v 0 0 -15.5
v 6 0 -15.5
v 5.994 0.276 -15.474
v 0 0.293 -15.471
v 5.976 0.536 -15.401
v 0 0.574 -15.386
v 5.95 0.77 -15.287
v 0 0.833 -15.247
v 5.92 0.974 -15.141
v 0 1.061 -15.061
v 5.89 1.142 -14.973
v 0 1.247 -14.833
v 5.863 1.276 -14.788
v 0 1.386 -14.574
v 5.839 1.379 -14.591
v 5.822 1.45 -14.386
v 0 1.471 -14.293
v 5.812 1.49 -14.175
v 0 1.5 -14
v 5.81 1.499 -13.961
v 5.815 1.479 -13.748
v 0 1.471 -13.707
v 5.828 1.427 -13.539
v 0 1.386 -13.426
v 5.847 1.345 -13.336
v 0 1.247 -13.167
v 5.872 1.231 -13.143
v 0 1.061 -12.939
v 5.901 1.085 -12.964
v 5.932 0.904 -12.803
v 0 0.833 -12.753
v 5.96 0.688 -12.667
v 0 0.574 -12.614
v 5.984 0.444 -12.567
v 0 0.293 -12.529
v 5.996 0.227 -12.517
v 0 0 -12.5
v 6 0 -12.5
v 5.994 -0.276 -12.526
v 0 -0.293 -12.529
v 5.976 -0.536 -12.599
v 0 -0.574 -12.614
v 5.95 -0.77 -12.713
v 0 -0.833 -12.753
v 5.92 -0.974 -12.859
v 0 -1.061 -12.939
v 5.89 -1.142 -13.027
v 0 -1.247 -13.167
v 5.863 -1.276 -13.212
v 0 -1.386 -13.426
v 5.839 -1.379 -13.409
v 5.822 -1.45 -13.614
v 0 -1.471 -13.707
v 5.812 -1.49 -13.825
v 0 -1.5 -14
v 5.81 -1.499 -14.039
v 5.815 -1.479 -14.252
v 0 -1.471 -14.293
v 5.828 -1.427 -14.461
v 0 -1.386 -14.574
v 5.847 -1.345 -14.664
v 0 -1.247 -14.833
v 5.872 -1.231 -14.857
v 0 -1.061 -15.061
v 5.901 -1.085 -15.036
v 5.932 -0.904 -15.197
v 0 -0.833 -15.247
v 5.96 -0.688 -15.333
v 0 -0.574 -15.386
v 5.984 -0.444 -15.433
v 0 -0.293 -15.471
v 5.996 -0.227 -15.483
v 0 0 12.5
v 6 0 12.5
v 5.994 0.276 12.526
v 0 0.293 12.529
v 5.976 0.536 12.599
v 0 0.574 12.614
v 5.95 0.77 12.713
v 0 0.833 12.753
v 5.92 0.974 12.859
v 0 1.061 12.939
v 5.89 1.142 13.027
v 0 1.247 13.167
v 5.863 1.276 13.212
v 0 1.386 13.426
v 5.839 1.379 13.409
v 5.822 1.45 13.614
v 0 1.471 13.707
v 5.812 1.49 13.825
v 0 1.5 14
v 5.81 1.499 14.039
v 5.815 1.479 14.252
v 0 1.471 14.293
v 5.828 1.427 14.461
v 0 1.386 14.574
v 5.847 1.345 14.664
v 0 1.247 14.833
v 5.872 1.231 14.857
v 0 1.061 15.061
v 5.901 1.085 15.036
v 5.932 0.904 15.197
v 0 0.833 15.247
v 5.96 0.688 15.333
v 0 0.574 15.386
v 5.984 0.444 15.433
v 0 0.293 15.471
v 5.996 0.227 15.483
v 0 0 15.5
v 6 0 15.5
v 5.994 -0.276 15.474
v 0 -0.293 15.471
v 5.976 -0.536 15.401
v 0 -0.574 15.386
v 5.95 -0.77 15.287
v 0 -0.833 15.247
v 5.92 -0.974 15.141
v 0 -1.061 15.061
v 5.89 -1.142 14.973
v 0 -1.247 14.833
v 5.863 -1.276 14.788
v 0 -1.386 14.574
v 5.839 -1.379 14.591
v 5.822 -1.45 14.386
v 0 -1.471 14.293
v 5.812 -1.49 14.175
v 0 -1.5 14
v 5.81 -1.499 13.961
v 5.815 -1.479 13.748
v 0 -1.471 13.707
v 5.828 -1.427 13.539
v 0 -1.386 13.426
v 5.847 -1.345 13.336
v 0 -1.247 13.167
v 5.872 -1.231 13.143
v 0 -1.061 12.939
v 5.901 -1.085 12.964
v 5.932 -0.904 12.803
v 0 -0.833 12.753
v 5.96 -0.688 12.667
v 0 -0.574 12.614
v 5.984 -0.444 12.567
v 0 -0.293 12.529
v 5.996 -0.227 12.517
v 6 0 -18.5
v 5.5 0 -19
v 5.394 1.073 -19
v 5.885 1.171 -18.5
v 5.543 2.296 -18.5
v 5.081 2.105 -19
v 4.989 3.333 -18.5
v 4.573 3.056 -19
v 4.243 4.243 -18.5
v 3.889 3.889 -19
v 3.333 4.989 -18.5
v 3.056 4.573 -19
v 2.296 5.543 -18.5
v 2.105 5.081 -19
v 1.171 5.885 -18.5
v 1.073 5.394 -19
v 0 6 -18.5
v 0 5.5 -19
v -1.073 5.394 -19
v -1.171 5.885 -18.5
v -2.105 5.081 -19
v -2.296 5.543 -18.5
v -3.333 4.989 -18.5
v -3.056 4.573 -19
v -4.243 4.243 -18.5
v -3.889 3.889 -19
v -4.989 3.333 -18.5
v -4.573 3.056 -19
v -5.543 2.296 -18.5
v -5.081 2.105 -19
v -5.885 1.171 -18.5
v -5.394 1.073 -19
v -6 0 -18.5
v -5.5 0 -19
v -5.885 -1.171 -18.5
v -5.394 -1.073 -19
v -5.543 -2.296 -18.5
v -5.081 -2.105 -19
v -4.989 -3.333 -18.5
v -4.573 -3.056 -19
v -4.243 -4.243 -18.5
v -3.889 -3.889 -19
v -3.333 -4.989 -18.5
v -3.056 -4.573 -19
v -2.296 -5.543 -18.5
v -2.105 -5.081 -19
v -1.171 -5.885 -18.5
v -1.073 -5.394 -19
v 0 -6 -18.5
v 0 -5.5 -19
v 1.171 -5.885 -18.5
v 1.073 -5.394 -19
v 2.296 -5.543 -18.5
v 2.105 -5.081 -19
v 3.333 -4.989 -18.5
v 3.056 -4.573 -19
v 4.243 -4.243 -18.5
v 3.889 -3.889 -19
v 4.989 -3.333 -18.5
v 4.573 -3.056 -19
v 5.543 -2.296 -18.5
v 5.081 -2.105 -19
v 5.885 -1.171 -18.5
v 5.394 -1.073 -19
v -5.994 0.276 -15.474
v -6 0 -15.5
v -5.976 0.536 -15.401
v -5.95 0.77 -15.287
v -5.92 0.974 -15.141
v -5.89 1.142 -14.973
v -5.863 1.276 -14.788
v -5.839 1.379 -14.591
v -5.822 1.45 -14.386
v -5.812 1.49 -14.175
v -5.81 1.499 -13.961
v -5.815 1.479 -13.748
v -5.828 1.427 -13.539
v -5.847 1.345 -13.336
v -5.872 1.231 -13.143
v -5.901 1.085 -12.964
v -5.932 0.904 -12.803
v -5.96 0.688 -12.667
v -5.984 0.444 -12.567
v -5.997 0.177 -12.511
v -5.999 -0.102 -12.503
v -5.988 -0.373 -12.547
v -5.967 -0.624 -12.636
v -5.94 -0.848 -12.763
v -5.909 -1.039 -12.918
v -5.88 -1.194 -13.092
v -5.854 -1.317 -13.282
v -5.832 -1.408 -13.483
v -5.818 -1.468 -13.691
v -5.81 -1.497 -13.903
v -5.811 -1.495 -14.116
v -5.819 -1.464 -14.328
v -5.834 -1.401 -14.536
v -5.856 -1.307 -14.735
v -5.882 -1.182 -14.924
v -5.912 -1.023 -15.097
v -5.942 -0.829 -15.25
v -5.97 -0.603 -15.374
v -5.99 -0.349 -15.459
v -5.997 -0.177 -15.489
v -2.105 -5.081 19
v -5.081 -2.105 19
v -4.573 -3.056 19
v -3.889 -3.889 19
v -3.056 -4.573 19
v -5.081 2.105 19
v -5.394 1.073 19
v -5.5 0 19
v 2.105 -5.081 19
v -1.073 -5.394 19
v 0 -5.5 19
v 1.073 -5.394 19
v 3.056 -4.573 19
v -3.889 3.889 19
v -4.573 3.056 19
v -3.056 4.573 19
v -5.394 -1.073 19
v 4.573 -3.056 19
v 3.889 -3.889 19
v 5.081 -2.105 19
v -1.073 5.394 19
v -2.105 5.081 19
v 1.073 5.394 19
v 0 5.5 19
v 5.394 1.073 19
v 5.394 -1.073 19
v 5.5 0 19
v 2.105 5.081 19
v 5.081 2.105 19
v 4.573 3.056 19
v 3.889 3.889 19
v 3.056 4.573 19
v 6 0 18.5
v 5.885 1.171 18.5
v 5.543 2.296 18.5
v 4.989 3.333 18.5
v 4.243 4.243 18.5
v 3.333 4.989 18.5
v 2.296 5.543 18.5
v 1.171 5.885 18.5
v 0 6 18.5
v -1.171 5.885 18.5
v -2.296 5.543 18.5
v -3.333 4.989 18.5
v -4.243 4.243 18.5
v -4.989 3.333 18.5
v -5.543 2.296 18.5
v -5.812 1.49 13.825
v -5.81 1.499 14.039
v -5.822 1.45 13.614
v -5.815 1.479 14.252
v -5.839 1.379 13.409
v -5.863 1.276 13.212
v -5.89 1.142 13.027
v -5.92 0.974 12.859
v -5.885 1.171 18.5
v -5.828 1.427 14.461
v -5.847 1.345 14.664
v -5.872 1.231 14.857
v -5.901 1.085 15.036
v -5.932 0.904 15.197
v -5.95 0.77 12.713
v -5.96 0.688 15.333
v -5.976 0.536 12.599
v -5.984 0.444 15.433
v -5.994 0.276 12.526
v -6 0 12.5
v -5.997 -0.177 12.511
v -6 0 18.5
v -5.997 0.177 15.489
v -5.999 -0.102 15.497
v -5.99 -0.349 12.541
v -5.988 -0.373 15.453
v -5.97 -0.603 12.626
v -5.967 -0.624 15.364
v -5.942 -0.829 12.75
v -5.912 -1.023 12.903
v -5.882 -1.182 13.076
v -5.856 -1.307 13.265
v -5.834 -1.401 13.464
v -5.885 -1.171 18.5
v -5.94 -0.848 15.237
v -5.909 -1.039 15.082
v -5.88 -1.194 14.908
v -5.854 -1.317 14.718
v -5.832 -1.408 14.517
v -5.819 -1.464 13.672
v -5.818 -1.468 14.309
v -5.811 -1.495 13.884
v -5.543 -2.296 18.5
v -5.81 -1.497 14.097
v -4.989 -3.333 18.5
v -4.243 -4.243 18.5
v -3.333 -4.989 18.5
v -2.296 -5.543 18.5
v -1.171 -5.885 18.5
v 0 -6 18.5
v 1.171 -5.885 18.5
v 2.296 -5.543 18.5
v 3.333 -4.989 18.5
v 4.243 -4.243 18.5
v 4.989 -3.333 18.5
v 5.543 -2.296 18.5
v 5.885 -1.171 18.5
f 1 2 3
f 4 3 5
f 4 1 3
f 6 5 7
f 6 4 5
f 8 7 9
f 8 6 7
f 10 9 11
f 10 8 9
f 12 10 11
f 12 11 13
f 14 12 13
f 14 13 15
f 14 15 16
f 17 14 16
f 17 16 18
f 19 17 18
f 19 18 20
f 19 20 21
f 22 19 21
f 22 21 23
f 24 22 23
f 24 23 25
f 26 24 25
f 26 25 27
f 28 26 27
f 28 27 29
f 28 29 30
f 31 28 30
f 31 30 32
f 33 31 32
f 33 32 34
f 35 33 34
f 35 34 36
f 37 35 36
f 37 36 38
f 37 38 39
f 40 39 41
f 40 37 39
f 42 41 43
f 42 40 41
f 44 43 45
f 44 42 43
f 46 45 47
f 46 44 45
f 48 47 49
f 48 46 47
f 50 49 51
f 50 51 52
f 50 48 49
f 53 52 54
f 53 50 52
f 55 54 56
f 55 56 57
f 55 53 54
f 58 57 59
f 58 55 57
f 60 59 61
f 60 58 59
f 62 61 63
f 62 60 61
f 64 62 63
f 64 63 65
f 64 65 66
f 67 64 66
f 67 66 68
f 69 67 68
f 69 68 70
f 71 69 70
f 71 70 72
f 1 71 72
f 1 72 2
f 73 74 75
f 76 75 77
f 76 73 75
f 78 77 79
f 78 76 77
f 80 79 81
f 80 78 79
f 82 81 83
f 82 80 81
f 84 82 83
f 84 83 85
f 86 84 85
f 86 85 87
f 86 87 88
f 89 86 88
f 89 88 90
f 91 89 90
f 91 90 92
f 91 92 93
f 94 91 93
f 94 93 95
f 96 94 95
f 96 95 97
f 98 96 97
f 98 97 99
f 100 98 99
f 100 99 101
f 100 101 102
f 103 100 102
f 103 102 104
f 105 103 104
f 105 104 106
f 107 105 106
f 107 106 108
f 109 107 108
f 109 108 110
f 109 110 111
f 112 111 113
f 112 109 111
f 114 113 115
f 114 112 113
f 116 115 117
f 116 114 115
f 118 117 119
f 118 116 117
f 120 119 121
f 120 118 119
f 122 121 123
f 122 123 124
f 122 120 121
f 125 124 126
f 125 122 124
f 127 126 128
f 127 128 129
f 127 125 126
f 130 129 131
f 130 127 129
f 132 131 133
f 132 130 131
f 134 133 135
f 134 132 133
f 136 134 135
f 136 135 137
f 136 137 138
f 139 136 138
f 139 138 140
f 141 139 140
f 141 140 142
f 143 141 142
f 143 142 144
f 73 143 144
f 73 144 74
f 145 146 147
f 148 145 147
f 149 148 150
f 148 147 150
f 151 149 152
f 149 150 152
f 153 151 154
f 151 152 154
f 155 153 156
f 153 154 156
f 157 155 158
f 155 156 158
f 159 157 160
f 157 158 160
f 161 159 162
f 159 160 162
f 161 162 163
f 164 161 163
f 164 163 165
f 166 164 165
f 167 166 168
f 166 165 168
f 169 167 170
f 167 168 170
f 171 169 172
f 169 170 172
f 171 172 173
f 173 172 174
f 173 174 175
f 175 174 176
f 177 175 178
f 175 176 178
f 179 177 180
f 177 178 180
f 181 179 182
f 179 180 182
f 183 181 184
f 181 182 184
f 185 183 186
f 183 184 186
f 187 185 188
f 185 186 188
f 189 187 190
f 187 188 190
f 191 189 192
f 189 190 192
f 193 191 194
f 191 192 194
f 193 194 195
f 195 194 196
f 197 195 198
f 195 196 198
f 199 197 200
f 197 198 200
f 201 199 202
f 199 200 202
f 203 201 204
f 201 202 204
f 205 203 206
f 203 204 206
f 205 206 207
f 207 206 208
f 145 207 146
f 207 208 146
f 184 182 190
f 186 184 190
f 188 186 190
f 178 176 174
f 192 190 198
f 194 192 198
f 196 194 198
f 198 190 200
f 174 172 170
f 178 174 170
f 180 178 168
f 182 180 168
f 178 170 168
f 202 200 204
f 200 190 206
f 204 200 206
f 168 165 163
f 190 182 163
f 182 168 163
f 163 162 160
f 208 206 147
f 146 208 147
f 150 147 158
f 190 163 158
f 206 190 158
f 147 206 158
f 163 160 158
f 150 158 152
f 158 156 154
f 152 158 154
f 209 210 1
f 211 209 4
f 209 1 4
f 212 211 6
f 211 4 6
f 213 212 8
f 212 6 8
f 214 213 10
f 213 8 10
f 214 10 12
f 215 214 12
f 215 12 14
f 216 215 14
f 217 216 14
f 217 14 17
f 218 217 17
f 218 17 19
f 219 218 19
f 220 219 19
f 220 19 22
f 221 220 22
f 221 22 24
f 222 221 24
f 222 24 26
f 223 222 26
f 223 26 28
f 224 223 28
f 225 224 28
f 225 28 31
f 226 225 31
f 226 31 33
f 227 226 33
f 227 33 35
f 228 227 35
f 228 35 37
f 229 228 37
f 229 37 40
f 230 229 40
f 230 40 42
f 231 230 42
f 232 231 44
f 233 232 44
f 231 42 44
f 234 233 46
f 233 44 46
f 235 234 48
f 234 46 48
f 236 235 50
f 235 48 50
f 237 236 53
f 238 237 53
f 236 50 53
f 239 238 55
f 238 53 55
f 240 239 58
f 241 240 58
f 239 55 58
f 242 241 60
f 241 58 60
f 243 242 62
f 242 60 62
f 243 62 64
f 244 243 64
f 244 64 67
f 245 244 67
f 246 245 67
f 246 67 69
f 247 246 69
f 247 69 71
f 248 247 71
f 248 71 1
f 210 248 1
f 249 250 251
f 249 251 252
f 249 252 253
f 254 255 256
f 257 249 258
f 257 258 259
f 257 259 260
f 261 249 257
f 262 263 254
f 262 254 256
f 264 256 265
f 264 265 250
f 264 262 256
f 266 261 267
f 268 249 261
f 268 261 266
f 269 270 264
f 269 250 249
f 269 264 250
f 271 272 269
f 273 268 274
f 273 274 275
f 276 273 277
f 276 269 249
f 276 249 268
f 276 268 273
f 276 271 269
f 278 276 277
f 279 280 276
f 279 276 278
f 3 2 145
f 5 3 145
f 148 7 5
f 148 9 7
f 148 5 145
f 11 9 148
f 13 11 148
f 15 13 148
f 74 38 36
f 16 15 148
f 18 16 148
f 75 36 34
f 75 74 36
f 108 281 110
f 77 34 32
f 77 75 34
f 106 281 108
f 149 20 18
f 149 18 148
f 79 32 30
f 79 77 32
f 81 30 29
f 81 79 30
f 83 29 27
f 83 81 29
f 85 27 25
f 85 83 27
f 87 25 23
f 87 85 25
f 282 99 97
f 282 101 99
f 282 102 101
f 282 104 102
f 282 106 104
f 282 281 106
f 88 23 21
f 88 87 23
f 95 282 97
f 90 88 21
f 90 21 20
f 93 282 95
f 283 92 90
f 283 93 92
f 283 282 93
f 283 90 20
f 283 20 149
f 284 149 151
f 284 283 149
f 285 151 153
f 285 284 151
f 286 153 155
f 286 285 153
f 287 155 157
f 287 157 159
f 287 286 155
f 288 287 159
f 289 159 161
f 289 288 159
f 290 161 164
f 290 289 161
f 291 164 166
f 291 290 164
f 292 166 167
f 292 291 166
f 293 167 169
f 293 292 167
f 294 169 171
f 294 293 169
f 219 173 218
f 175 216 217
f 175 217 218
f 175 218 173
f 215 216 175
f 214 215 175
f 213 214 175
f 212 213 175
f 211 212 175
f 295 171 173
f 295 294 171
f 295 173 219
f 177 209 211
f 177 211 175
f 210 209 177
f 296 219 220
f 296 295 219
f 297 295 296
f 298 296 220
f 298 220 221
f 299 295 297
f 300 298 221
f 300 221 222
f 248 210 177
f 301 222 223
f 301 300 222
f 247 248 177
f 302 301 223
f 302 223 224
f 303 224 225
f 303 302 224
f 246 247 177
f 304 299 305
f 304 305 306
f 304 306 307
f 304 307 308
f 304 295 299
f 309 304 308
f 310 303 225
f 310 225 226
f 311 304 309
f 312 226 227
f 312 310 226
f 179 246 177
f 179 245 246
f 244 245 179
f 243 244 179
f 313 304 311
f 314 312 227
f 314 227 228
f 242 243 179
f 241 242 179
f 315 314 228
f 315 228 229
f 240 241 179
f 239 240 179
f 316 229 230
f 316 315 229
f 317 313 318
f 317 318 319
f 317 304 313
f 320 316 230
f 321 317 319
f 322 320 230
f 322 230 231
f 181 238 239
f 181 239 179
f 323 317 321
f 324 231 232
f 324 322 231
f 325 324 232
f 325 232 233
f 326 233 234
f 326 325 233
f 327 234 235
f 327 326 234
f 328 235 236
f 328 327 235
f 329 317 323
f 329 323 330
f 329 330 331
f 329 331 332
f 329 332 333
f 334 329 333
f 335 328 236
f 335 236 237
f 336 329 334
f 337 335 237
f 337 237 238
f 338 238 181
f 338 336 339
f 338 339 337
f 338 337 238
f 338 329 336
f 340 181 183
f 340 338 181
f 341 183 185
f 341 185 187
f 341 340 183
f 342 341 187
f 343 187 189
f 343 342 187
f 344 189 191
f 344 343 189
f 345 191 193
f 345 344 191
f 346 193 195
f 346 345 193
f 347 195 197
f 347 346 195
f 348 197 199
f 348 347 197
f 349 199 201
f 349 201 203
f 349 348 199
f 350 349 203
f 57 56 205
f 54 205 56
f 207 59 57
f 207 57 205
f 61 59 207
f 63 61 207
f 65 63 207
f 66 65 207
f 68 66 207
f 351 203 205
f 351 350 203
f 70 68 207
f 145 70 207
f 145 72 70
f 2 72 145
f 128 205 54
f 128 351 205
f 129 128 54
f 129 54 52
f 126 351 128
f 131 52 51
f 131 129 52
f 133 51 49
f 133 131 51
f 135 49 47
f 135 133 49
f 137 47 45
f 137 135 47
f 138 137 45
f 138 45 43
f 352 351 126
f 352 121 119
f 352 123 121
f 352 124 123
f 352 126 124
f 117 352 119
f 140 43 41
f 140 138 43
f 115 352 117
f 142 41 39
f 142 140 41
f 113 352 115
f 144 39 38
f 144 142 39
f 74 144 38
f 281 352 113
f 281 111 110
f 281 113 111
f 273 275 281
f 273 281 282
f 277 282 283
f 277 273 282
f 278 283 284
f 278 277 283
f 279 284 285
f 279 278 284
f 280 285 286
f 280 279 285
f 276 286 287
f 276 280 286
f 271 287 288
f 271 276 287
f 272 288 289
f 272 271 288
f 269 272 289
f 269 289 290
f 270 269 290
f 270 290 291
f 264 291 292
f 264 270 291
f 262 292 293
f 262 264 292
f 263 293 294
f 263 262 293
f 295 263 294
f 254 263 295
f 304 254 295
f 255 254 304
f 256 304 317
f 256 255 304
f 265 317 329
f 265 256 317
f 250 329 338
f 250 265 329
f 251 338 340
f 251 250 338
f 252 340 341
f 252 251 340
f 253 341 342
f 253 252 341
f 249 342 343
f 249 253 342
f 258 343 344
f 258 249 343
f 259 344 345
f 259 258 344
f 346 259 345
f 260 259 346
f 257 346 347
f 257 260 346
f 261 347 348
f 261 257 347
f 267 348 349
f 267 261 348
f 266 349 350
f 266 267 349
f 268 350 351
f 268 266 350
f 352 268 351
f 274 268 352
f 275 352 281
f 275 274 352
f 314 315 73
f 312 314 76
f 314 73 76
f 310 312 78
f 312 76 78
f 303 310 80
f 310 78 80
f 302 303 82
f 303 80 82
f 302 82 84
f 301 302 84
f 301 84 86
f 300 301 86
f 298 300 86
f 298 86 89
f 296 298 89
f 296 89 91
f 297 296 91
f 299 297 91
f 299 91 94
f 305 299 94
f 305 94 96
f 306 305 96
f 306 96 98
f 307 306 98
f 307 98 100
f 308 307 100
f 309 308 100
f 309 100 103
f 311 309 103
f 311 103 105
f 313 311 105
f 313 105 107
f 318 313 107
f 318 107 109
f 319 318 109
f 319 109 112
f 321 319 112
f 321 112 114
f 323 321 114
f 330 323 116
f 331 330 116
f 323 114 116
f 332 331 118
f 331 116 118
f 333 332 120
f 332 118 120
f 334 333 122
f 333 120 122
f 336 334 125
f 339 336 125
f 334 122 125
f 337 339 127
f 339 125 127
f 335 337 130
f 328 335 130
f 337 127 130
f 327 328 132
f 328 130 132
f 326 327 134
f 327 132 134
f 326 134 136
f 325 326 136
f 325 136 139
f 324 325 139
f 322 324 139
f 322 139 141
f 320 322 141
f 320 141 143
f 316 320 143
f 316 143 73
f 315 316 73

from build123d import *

# Parameters (mm, degrees)
SKETCH1_R            = 6
BODY_DEPTH           = 19
SKETCH2_R            = 1.5
HOLES_DEPTH          = 7
HOLES_DEPTH_BACK     = 7
F_1X_45_CHAMFER_SIZE = 0.5


with BuildPart() as part:
    # Sketch1 → Body (new body, symmetric)
    with BuildSketch(Plane.XY):
        Circle(SKETCH1_R)
    extrude(amount=BODY_DEPTH, both=True)

    # Sketch2 → Holes (cut, two sides)
    with BuildSketch(Plane(origin=(0, 0, 0), x_dir=(0, 0, -1), z_dir=(1, 0, 0))) as holes_sk:
        with Locations((-14, 0)):
            Circle(SKETCH2_R)
        with Locations((14, 0)):
            Circle(SKETCH2_R)
    extrude(amount=HOLES_DEPTH, mode=Mode.SUBTRACT)
    extrude(holes_sk.sketch, amount=-HOLES_DEPTH_BACK, mode=Mode.SUBTRACT)

    # 1x 45 Chamfer
    f_1x_45_chamfer_edges = [part.edges().sort_by_distance(p)[0] for p in [
        (-6, 0, -19),
        (-6, 0, 19),
    ]]
    chamfer(f_1x_45_chamfer_edges, length=F_1X_45_CHAMFER_SIZE)


solid = part.part
